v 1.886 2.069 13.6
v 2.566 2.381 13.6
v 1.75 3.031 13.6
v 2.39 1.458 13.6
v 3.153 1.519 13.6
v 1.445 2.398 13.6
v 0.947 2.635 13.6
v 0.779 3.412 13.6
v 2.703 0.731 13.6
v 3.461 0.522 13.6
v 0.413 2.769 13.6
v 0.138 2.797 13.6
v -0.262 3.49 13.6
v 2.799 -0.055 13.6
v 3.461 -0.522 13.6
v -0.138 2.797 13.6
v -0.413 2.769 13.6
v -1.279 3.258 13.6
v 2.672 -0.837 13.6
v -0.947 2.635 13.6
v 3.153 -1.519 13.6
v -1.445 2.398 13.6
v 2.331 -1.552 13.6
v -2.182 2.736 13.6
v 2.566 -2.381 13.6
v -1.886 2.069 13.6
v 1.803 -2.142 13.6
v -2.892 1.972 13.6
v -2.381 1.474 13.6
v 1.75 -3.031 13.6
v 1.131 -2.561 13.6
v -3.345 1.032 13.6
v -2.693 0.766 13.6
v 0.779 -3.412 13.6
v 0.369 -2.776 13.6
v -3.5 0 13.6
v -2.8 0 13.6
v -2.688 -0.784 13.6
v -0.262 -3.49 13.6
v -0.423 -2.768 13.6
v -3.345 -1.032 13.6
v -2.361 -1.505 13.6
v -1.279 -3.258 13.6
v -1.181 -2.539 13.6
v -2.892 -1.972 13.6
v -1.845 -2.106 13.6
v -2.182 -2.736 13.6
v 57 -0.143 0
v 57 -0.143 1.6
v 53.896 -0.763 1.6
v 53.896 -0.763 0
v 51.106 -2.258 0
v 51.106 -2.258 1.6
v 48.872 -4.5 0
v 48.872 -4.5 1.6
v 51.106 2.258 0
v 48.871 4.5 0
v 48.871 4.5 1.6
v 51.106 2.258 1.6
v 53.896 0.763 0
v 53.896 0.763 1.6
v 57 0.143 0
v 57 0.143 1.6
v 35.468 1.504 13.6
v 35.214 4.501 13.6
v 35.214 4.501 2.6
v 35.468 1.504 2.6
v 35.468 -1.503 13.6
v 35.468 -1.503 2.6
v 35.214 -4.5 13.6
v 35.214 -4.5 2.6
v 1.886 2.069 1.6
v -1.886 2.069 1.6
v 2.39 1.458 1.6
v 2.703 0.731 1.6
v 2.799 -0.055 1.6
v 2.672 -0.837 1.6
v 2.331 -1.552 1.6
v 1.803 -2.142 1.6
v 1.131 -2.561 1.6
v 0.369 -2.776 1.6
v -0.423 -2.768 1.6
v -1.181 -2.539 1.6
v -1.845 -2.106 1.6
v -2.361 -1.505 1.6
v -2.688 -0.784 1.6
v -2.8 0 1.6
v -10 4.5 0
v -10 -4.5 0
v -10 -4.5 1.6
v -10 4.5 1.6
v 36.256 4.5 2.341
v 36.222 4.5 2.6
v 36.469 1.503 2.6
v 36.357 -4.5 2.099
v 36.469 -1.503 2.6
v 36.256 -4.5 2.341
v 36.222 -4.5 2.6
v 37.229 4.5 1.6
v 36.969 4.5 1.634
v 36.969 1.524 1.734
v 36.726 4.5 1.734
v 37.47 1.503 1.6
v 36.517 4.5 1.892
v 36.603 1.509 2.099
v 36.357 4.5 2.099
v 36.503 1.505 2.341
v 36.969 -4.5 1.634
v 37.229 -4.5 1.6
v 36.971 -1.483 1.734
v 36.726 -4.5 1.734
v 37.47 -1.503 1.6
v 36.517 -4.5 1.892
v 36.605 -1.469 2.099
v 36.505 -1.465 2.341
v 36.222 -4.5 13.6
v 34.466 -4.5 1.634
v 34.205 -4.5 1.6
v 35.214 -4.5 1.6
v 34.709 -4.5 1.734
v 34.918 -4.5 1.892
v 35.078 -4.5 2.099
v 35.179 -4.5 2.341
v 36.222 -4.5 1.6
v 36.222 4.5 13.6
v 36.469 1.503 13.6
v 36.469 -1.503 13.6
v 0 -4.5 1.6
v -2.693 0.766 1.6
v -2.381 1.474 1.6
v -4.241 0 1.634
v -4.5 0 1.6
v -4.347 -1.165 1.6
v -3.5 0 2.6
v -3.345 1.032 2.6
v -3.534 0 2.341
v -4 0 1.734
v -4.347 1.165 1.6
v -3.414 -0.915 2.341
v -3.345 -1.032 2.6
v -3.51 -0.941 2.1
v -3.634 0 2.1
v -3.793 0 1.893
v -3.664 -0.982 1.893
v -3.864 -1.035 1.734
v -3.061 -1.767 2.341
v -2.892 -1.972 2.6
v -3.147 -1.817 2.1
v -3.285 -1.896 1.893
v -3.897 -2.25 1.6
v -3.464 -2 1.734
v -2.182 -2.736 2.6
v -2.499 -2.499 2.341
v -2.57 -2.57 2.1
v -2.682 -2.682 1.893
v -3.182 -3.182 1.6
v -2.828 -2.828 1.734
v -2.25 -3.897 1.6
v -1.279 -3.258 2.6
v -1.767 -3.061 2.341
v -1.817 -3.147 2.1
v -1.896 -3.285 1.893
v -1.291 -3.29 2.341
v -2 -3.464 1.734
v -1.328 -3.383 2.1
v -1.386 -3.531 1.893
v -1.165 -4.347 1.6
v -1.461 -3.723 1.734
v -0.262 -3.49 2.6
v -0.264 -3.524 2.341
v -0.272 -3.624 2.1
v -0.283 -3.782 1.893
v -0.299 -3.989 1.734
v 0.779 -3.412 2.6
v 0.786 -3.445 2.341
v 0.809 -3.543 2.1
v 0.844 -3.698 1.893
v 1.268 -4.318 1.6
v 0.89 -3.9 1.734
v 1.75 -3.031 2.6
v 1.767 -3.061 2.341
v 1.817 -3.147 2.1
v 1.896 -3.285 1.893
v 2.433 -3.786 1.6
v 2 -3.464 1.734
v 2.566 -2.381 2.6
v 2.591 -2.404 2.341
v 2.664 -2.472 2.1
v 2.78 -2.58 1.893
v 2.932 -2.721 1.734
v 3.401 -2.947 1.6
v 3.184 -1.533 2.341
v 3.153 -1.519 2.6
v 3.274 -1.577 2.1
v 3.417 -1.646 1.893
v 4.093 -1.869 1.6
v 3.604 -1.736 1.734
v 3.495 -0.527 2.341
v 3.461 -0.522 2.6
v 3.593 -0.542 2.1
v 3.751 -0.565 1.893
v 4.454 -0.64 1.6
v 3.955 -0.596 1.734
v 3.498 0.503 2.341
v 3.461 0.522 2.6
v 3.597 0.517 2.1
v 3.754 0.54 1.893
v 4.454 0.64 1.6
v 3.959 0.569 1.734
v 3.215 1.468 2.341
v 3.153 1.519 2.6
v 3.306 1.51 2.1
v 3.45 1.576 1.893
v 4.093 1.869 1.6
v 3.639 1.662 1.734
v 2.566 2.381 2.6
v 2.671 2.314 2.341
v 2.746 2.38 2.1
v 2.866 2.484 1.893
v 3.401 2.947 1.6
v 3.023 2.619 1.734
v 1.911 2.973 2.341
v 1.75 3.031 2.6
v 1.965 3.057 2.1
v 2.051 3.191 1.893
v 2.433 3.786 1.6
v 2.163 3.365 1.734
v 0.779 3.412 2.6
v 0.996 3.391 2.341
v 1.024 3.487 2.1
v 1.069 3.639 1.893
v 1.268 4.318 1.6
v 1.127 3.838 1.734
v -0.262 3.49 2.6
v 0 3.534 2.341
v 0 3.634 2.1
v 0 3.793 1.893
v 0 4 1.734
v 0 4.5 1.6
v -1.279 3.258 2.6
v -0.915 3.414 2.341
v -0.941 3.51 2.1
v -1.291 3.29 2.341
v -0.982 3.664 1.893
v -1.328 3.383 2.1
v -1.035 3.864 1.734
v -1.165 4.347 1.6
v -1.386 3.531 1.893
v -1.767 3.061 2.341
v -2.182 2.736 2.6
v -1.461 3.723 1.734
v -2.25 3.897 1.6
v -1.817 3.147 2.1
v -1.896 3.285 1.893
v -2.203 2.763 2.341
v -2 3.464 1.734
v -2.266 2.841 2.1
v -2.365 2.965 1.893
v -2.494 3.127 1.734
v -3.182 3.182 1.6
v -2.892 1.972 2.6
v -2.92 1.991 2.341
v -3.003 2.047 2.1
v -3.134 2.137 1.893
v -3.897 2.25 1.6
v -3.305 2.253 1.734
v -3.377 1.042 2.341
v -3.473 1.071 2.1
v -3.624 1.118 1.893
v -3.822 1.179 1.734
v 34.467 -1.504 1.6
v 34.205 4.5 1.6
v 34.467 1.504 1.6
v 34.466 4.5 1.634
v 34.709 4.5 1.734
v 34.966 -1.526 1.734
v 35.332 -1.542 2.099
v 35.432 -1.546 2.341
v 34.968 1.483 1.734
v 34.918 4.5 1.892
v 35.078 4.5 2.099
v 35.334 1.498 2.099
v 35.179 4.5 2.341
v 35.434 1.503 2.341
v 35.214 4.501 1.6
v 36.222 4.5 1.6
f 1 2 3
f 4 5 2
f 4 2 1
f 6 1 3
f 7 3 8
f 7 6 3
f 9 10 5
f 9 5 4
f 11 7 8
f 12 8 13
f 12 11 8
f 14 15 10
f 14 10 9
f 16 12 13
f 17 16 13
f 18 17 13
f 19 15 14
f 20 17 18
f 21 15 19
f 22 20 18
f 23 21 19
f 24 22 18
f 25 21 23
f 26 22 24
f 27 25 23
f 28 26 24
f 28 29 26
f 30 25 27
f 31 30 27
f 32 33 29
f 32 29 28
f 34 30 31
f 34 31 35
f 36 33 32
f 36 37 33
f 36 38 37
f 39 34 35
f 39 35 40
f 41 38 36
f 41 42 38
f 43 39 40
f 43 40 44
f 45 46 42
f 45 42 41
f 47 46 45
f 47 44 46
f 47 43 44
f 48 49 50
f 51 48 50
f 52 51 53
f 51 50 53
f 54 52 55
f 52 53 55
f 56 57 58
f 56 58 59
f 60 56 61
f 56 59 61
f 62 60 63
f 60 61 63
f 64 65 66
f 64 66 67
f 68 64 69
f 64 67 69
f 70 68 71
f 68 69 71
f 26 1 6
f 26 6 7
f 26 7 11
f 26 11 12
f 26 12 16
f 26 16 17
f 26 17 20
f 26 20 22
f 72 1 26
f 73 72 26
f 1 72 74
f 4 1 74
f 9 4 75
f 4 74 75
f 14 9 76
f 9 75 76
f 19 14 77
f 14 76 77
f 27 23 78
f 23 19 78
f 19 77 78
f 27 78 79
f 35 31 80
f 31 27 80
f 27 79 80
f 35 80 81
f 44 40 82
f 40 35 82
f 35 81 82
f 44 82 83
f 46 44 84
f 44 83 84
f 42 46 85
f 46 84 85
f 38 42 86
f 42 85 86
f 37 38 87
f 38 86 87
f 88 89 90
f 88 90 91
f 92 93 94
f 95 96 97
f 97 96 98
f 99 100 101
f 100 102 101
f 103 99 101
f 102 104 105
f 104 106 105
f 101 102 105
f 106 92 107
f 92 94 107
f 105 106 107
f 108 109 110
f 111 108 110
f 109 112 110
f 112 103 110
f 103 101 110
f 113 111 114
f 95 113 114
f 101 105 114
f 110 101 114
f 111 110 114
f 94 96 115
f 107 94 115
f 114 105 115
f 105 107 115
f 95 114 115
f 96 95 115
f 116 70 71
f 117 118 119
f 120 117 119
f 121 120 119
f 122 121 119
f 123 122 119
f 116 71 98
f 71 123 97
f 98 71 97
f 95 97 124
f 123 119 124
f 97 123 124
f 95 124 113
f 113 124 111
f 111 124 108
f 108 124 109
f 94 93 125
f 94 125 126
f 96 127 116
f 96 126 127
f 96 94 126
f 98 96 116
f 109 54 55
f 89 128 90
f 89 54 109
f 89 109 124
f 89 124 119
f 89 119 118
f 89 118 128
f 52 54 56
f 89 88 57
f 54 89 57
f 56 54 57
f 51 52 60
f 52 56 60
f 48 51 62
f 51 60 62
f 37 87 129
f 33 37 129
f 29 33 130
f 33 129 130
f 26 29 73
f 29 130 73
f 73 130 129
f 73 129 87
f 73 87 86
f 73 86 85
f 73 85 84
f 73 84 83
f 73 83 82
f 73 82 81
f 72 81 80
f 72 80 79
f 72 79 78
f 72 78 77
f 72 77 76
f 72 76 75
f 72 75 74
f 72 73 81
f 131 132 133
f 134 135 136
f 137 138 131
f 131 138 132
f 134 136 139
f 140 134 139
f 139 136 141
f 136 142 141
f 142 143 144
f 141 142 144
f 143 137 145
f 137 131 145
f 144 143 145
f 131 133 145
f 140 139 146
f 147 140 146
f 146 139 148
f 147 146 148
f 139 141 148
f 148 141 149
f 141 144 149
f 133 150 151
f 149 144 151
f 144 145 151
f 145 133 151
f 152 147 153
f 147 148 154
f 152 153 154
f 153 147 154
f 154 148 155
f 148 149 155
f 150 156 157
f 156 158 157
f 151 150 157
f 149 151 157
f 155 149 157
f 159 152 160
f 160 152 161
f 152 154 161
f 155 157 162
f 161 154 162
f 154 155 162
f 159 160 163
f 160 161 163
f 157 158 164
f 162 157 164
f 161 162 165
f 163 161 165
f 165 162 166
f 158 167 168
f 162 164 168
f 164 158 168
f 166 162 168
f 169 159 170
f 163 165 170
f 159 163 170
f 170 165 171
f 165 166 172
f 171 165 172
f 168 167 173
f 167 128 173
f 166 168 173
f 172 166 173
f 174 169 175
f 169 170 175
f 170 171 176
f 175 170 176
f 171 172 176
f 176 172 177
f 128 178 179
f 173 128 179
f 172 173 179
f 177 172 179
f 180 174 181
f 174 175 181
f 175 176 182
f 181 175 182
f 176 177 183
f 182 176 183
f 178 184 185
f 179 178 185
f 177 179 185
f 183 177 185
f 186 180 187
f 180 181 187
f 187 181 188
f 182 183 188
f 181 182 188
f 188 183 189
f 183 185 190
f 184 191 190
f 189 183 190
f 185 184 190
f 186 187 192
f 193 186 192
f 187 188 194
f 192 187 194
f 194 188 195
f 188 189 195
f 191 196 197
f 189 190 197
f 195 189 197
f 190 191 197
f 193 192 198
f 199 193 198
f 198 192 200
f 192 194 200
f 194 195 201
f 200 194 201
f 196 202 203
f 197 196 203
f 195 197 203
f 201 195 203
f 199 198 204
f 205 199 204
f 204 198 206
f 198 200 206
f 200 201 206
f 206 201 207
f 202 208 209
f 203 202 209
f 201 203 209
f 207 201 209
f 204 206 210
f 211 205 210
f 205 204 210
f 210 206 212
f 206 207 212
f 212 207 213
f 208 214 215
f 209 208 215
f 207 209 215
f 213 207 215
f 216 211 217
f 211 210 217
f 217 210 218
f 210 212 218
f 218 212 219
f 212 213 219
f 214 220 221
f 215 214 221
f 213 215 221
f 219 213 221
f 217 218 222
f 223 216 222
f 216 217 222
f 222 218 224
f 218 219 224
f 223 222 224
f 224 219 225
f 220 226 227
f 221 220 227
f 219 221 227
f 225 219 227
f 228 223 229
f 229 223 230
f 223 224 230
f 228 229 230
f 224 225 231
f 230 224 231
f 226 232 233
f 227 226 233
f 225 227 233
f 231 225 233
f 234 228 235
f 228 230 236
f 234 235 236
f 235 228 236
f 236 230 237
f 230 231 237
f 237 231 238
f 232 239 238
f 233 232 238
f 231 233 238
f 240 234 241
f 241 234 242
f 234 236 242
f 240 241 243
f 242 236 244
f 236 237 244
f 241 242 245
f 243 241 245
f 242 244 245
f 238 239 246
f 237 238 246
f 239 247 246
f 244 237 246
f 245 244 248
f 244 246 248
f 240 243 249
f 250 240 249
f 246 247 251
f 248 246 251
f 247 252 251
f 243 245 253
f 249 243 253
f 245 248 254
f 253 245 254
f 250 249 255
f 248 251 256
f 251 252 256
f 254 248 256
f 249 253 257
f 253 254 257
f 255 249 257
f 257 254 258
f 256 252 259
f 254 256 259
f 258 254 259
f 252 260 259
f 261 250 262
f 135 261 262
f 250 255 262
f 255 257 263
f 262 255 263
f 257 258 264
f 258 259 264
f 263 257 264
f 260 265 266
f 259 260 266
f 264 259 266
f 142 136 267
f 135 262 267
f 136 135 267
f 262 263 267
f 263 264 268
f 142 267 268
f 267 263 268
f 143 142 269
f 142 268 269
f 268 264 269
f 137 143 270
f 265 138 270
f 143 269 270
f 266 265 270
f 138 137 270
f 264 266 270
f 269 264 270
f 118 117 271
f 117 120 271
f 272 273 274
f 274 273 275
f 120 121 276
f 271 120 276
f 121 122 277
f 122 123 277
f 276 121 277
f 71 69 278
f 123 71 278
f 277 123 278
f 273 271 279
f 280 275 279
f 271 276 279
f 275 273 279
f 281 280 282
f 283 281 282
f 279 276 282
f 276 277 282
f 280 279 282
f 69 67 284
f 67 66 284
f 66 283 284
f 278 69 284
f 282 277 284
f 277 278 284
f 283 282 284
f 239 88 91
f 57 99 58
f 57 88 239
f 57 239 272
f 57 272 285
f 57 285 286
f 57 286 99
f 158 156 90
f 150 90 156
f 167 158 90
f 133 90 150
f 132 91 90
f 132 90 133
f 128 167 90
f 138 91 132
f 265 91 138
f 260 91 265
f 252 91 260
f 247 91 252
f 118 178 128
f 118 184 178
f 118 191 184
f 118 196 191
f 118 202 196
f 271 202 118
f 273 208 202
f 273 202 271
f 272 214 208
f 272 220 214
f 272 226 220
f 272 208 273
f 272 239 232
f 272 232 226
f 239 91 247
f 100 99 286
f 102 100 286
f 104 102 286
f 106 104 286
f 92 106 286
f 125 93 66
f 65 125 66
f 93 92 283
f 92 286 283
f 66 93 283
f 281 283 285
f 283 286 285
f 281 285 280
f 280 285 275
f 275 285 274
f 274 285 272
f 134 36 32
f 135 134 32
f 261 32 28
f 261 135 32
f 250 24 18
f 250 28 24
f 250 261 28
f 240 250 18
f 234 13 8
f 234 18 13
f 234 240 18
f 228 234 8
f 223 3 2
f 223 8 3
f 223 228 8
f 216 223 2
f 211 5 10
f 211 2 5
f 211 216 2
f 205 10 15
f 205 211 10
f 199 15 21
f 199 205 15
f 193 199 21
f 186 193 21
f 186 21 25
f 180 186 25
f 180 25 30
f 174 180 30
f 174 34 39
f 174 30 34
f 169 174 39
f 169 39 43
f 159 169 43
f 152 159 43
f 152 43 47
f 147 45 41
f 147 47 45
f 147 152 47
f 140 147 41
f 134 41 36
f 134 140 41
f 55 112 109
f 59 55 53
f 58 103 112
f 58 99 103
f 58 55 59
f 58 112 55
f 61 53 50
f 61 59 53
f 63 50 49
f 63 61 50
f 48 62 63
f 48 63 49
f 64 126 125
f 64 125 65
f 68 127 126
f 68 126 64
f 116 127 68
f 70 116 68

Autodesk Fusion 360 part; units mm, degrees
sketch "Esquisse1" plane through (0, 0, 0) normal (0, 0, 1) x (1, 0, 0)
  line L0 (-10, 4.5) -> (57, 4.5)
  line L1 (57, 4.5) -> (57, -4.5)
  line L2 (57, -4.5) -> (-10, -4.5)
  line L3 (-10, -4.5) -> (-10, 4.5)
  dimension "d1" = 67
  dimension "d2" = 9
  dimension "d3" = 10
  dimension "d4" = 4.5
extrude "Extrusion1" add sketch "Esquisse1" along normal blind 1.6
sketch "Esquisse2" plane through (0, 0, 1.6) normal (0, 0, 1) x (-1, 0, 0)
  line L0 (10, 4.5) -> (-57, 4.5)
  line L1 (-57, 4.5) -> (-57, -4.5)
  line L2 (-57, -4.5) -> (10, -4.5)
  line L3 (10, -4.5) -> (10, 4.5)
  circle A0 centre (0, 0) radius 3.5
  arc A1 (-35.2136, 4.5) -> (-35.2135, -4.5007) centre (0, 0) ccw
  arc A2 (-36.2215, 4.5) -> (-36.2215, -4.5) centre (0, 0) ccw
  line L4 (-35.2135, -4.5007) -> (-36.2215, -4.5)
  line L5 (-35.2135, -4.5007) -> (-36.2215, -4.5)
  line L6 (-35.2136, 4.5) -> (-36.2215, 4.5)
  circle A3 centre (0, 0) radius 2.8
  dimension "d7" = 7
  dimension "d8" = 35.5
  dimension "d9" = 36.5
  dimension "d10" = 5.6
extrude "Extrusion2" add sketch "Esquisse2" along normal blind 12 contours L0 L2 A1 A2 L4 L5 L6
extrude "Extrusion3" add sketch "Esquisse2" along normal blind 12 contours A0
sketch "Esquisse3" plane through (0, 0, 13.6) normal (0, 0, 1) x (-1, 0, 0)
  circle A0 centre (0, 0) radius 2.8
  circle A1 centre (0, 0) radius 3.5
  line L0 (2.0235, -2.7693) -> (-1.9765, -2.7693)
  line L1 (-1.9765, -2.7693) -> (-1.9765, -2.0693)
  line L2 (-1.9765, -2.0693) -> (2.0235, -2.0693)
  line L3 (2.0235, -2.0693) -> (2.0235, -2.7693)
  dimension "d15" = 4
  dimension "d16" = 0.7
extrude "Extrusion4" add sketch "Esquisse3" against normal blind 12.2 contours A0 L0 L2 | A0 L0
sketch "Esquisse4" plane through (0, 0, 1.6) normal (0, 0, 1) x (-1, 0, 0)
  circle A0 centre (-57.5342, 10.9) radius 10.7703
  circle A1 centre (-57.5342, -10.9) radius 10.7705
  dimension "d19" = 21.5407
  dimension "d20" = 21.541
  dimension "d21" = 10.9
  dimension "d22" = 10.9
  dimension "d23" = 57.5342
  dimension "d24" = 57.5342
extrude "Extrusion5" cut sketch "Esquisse4" against normal blind 2
fillet "Congé1" radius 1 1 edges at (3.2631, -1.2657, 1.6)
fillet "Congé2" radius 1 2 edges at (35.5, 0, 1.6) (36.5, 0, 1.6)
equation "d23 = 50.53419 mm + 7 mm"
equation "d24 = 50.53419 mm + 7 mm"
